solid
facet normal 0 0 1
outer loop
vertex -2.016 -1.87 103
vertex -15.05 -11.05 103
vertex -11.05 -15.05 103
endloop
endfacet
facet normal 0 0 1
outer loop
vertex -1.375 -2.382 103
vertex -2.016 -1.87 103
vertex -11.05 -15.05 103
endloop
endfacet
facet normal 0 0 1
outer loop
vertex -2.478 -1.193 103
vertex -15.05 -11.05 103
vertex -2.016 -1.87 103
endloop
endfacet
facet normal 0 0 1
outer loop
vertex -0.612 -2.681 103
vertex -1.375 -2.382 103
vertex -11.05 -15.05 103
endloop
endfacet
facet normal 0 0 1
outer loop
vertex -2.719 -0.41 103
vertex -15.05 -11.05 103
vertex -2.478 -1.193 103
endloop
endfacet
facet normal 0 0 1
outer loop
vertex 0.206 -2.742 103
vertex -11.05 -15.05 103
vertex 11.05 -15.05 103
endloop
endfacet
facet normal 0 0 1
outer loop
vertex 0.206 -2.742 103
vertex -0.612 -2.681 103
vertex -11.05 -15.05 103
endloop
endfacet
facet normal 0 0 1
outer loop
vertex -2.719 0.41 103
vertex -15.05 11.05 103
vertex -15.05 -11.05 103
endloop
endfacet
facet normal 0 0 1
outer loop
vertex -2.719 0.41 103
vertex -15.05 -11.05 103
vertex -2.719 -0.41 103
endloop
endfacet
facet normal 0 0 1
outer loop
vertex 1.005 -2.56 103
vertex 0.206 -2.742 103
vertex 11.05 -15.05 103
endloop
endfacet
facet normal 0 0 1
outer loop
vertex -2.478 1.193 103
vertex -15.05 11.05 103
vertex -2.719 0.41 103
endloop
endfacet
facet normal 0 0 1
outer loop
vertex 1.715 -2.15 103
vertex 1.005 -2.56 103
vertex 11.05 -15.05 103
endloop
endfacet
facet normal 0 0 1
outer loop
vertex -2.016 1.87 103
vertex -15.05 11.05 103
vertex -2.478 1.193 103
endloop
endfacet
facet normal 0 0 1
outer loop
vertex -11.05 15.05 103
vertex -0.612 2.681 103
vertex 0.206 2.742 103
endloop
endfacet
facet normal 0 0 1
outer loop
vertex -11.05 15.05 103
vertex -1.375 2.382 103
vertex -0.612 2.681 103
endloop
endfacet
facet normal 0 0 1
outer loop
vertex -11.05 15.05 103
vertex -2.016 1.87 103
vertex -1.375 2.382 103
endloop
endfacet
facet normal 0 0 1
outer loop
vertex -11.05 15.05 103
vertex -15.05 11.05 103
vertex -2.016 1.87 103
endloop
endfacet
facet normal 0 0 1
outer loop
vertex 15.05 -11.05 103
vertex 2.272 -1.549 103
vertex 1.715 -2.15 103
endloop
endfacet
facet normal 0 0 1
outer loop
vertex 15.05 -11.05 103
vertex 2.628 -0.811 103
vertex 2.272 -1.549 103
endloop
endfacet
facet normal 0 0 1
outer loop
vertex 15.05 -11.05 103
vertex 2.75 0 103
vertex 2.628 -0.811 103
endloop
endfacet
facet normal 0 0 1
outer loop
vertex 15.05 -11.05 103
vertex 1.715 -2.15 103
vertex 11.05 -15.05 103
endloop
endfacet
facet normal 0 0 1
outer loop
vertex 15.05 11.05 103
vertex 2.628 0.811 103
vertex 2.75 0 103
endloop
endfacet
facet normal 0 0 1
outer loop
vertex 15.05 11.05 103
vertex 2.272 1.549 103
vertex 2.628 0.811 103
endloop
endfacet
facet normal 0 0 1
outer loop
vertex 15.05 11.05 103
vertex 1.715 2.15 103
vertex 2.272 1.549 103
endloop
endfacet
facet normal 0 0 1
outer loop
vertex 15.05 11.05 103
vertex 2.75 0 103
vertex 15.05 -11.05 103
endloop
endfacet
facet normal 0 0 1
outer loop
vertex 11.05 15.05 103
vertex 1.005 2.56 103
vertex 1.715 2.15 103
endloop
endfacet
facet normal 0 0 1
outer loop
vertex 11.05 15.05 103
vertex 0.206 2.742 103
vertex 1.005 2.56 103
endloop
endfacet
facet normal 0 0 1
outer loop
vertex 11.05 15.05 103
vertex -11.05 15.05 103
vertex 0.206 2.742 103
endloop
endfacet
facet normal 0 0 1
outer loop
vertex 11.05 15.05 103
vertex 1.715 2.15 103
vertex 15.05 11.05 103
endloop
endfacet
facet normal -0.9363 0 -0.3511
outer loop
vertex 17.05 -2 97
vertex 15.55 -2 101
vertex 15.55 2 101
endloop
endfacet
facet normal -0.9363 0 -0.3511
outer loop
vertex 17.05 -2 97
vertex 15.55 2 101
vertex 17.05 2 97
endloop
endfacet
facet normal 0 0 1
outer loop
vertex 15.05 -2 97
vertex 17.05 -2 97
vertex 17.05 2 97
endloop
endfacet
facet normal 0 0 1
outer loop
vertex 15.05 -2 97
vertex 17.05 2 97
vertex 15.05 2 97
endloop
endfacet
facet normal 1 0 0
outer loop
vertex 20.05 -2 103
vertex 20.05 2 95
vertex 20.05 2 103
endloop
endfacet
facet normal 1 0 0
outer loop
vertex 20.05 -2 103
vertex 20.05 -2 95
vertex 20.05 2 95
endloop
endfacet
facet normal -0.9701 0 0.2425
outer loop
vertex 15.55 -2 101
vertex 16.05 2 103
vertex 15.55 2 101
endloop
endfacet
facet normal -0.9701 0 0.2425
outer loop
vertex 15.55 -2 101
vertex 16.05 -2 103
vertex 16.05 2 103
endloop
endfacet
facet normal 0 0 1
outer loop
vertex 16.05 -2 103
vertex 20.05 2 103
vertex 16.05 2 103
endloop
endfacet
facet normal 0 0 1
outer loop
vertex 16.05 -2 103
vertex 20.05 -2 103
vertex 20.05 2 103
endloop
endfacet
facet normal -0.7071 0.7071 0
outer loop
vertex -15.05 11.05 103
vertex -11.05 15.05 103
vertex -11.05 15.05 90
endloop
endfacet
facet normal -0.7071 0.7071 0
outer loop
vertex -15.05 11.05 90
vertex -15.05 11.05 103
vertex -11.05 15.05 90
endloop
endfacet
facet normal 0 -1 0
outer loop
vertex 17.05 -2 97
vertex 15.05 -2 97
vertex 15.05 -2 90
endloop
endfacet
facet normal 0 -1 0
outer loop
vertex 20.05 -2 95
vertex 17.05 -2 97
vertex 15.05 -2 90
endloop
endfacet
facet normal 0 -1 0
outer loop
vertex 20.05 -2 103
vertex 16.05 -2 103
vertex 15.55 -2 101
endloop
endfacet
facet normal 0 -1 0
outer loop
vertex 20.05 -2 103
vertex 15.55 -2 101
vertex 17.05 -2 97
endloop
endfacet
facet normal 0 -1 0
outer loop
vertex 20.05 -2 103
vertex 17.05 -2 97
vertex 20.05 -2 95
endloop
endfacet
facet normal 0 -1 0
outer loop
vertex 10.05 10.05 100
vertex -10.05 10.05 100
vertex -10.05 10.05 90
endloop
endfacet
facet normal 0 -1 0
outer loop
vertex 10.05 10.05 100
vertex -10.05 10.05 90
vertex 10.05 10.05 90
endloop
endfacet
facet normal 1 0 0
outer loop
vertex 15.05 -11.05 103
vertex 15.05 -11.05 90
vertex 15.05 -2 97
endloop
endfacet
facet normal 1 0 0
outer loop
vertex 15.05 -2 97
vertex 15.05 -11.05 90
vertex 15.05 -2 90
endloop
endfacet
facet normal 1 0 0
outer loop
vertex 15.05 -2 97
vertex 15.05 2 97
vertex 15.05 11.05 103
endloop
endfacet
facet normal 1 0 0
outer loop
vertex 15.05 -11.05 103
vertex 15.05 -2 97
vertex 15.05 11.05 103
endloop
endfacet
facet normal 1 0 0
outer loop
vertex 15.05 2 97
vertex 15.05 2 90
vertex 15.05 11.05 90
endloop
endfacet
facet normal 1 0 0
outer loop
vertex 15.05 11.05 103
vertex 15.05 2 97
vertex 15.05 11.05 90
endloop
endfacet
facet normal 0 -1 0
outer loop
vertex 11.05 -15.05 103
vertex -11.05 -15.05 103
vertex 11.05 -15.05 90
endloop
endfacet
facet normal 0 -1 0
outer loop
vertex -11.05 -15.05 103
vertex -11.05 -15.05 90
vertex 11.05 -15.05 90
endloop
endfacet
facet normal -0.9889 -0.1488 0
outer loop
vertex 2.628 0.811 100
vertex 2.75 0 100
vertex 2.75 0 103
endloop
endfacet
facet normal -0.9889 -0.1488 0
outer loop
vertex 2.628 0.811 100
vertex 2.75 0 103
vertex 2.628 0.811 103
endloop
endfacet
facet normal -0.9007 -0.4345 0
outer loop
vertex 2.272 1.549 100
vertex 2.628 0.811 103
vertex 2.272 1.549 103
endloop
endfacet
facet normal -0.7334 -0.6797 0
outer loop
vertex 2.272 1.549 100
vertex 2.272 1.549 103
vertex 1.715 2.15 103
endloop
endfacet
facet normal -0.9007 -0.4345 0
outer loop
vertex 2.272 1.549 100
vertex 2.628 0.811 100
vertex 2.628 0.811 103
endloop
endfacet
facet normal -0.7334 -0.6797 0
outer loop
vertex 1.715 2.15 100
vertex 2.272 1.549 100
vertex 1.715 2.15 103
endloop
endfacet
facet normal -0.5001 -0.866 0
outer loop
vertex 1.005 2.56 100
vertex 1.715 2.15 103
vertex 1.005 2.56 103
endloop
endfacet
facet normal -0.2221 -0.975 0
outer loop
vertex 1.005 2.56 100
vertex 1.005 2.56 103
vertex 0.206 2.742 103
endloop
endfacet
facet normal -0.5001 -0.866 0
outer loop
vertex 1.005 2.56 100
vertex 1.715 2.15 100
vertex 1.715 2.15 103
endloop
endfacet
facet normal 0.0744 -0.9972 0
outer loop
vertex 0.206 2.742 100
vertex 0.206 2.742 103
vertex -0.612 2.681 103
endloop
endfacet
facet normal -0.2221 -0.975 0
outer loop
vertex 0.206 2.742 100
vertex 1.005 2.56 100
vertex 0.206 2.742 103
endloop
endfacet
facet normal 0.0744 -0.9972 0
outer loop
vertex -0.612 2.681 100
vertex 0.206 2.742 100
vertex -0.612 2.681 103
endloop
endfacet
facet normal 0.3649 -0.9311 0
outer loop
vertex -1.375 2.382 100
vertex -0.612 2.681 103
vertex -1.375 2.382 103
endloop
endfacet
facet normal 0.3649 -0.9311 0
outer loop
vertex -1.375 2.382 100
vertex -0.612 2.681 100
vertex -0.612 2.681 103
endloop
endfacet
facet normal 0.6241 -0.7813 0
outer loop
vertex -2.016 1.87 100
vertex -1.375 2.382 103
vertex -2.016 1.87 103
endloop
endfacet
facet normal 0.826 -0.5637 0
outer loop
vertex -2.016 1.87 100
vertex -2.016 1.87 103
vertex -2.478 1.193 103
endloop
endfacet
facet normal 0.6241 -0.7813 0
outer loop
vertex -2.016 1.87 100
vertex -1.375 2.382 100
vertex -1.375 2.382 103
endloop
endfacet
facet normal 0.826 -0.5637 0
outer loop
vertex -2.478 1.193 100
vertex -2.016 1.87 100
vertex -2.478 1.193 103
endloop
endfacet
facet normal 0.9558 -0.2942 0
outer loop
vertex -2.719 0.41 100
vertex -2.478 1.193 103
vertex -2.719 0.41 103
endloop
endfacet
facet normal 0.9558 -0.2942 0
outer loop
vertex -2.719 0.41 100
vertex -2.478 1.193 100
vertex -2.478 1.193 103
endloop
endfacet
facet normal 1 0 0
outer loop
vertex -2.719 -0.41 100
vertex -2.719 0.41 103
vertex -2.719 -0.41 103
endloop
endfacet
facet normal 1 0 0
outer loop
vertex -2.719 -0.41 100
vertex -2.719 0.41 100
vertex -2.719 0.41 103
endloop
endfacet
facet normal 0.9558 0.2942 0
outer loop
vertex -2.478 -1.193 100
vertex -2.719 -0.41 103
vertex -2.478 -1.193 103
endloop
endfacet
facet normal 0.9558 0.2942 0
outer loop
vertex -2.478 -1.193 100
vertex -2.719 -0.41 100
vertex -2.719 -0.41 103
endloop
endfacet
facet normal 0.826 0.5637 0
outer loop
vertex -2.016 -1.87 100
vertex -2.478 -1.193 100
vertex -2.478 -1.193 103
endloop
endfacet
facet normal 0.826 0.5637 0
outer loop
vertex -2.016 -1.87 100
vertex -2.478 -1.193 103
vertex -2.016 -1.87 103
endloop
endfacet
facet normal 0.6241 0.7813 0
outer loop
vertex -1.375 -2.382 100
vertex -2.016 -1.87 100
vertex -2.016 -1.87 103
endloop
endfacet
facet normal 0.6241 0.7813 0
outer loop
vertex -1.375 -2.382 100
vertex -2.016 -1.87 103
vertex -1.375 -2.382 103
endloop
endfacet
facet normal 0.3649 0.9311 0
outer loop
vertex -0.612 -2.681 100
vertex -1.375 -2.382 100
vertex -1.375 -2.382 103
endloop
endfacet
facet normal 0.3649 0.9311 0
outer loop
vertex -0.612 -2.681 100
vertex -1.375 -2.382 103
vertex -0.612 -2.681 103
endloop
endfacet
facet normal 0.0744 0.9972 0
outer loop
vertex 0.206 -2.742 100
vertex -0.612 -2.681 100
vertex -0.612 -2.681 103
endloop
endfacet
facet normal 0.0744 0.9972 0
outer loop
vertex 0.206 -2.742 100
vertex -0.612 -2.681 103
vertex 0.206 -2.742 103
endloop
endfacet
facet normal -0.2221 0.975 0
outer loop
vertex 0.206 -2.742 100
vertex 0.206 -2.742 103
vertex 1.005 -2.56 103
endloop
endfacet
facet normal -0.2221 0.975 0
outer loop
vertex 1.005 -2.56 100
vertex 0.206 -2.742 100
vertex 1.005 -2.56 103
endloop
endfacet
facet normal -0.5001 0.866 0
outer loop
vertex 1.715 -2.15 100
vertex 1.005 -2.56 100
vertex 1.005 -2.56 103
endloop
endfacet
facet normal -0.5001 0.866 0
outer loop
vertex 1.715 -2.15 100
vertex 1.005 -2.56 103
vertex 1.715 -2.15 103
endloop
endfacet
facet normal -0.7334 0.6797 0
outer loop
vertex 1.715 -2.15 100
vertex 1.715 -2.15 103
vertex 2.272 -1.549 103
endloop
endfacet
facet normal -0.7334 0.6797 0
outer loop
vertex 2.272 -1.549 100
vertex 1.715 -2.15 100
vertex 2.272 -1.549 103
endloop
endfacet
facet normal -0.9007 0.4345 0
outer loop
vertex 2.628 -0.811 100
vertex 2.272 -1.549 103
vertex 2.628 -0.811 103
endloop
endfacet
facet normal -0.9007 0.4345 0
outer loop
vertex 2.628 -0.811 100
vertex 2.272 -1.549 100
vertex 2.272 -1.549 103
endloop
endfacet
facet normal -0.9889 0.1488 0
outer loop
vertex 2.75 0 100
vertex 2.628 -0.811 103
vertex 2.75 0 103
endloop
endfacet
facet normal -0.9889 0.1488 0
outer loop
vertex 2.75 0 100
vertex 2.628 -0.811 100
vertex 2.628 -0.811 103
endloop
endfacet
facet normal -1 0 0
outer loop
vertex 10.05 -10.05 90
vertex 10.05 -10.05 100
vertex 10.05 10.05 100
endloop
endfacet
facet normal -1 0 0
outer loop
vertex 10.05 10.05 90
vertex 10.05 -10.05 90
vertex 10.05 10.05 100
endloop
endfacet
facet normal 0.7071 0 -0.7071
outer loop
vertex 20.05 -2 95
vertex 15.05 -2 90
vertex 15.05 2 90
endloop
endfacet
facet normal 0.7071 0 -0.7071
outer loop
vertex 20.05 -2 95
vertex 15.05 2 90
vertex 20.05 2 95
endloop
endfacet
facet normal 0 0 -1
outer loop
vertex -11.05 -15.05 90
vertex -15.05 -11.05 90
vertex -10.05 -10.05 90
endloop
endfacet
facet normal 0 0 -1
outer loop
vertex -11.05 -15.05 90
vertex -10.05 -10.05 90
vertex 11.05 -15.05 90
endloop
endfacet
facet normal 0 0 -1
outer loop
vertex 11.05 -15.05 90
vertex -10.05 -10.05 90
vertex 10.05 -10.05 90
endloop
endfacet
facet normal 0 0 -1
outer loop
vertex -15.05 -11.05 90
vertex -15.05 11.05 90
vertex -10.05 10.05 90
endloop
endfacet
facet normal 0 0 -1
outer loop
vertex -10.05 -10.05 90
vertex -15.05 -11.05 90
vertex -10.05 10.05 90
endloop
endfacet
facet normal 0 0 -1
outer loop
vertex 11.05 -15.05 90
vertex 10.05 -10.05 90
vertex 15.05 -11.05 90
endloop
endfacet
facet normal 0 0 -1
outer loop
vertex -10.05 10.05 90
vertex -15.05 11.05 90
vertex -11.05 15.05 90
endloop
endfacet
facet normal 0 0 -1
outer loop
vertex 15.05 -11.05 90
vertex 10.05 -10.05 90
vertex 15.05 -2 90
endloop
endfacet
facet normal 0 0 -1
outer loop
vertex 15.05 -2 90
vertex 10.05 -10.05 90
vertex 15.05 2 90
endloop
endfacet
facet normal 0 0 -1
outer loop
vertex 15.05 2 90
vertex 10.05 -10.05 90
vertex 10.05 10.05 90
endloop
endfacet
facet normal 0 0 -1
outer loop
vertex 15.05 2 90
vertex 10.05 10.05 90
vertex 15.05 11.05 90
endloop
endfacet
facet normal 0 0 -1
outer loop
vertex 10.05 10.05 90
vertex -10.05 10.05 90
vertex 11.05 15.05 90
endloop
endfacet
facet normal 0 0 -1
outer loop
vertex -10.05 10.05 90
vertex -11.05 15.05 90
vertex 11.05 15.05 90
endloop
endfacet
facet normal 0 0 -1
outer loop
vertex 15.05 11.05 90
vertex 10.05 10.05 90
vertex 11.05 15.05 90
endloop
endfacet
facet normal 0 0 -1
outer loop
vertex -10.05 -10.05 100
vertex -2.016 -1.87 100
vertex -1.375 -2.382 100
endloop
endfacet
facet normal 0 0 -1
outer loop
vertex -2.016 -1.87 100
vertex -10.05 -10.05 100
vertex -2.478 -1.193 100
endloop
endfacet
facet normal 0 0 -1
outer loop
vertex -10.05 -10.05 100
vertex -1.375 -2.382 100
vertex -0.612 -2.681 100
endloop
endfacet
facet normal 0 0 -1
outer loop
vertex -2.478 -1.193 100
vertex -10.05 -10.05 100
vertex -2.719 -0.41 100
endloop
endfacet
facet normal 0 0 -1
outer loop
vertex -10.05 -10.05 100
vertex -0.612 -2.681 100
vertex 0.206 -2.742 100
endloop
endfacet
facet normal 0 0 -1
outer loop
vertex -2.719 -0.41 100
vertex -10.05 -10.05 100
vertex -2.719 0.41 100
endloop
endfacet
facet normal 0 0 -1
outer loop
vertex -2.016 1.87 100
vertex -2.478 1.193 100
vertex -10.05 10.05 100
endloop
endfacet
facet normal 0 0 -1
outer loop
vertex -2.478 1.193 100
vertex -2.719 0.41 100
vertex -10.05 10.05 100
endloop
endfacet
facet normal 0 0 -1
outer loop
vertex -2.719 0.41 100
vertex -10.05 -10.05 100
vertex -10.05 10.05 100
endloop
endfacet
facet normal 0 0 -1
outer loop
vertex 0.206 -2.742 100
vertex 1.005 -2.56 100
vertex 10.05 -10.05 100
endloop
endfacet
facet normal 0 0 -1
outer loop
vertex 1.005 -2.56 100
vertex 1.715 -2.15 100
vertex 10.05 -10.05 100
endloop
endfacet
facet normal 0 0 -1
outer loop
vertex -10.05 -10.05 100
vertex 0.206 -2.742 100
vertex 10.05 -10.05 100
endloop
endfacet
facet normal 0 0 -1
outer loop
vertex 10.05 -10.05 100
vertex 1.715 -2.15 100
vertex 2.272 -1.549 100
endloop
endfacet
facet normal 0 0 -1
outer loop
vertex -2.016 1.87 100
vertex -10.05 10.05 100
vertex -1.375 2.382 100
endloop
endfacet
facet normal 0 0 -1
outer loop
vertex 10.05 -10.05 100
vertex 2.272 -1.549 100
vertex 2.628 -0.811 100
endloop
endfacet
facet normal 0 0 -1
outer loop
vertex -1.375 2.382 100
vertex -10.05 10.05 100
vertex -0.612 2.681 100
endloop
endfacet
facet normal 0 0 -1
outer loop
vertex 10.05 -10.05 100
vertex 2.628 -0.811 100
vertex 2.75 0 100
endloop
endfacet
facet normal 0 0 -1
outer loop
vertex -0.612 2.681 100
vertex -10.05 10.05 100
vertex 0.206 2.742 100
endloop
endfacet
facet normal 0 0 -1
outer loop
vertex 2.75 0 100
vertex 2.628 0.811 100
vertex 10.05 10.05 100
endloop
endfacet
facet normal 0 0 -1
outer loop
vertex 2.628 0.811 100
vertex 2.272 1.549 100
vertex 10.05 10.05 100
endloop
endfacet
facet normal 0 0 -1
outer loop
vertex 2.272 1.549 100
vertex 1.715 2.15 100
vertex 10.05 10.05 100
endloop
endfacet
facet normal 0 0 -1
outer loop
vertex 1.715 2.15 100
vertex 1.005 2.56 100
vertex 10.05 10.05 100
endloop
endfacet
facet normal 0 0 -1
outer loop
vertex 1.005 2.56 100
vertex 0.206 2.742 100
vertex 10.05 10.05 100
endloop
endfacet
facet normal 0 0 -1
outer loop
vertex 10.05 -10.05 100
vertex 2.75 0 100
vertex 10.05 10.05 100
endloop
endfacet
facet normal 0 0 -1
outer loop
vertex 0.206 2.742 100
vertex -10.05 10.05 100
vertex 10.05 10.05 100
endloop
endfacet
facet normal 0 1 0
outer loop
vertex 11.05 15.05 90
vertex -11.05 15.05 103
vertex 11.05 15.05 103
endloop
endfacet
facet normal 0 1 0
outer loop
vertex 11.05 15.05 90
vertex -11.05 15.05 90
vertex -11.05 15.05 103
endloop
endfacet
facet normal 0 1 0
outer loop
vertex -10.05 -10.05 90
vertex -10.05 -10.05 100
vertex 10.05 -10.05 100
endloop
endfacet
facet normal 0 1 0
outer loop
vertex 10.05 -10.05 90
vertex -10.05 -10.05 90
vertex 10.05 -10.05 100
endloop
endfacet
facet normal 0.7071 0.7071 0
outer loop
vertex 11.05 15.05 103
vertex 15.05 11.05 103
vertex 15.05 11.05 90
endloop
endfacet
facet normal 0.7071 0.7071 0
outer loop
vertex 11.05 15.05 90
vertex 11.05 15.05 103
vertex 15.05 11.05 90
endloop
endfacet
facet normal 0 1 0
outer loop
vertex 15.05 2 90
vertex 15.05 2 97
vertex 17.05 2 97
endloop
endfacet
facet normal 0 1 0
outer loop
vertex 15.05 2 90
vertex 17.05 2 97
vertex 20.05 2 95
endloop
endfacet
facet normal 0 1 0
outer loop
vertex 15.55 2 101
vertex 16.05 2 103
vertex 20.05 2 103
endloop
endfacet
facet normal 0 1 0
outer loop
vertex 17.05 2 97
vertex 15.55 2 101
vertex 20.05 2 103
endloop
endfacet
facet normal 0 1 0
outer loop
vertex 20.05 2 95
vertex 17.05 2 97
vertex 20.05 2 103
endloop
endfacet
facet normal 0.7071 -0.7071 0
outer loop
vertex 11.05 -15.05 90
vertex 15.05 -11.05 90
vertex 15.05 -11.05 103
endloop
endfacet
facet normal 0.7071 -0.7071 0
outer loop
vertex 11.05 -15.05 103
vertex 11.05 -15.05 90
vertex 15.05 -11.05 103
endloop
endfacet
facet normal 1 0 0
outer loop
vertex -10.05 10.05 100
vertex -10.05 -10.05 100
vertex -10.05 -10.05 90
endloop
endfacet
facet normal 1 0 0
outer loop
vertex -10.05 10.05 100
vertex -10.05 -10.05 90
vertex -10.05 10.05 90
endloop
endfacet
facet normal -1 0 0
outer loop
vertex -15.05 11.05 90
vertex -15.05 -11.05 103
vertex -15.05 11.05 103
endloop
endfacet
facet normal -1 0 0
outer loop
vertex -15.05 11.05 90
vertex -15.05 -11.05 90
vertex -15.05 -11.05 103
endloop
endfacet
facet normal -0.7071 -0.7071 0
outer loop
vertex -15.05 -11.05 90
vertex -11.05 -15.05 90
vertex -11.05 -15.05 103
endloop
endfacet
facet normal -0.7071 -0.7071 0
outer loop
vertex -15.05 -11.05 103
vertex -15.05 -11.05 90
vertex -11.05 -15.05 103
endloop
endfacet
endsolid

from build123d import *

# Parameters (mm, degrees)
SKETCH007_W     = 30.1
SKETCH007_H     = 30.1
SKETCH007_W_2   = 20.1
SKETCH007_H_2   = 20.1
PAD005_DEPTH    = 10
SKETCH008_W     = 30.1
SKETCH008_H     = 30.1
SKETCH008_R     = 2.75
PAD006_DEPTH    = 3
PAD007_DEPTH    = 2
CHAMFER003_SIZE = 4


with BuildPart() as part:
    # Sketch007 → Pad005 (new body)
    with BuildSketch(Plane.XY):
        Rectangle(SKETCH007_W, SKETCH007_H)
        Rectangle(SKETCH007_W_2, SKETCH007_H_2, mode=Mode.SUBTRACT)
    extrude(amount=-PAD005_DEPTH)

    # Sketch008 → Pad006 (join)
    with BuildSketch(Plane.XY):
        Rectangle(SKETCH008_W, SKETCH008_H)
        Circle(SKETCH008_R, mode=Mode.SUBTRACT)
    extrude(amount=PAD006_DEPTH)

    # Sketch009 → Pad007 (join, symmetric)
    with BuildSketch(Plane.XZ):
        Polygon((16.05, 3), (15.55, 1), (17.05, -3), (15.05, -3), (15.05, -10), (20.05, -5), (20.05, 3), align=None)
    extrude(amount=PAD007_DEPTH, both=True)

    # Chamfer003
    chamfer003_edges = [part.edges().sort_by_distance(p)[0] for p in [
        (15.05, -15.05, 1.5),
        (15.05, -15.05, -5),
        (-15.05, -15.05, 1.5),
        (-15.05, -15.05, -5),
        (15.05, 15.05, 1.5),
        (15.05, 15.05, -5),
        (-15.05, 15.05, 1.5),
        (-15.05, 15.05, -5),
    ]]
    chamfer(chamfer003_edges, length=CHAMFER003_SIZE)


with BuildPart() as part_1:
    # Body003 placement: moved
    add(part.part.moved(Location((0, 0, 100))))


solid = part_1.part
